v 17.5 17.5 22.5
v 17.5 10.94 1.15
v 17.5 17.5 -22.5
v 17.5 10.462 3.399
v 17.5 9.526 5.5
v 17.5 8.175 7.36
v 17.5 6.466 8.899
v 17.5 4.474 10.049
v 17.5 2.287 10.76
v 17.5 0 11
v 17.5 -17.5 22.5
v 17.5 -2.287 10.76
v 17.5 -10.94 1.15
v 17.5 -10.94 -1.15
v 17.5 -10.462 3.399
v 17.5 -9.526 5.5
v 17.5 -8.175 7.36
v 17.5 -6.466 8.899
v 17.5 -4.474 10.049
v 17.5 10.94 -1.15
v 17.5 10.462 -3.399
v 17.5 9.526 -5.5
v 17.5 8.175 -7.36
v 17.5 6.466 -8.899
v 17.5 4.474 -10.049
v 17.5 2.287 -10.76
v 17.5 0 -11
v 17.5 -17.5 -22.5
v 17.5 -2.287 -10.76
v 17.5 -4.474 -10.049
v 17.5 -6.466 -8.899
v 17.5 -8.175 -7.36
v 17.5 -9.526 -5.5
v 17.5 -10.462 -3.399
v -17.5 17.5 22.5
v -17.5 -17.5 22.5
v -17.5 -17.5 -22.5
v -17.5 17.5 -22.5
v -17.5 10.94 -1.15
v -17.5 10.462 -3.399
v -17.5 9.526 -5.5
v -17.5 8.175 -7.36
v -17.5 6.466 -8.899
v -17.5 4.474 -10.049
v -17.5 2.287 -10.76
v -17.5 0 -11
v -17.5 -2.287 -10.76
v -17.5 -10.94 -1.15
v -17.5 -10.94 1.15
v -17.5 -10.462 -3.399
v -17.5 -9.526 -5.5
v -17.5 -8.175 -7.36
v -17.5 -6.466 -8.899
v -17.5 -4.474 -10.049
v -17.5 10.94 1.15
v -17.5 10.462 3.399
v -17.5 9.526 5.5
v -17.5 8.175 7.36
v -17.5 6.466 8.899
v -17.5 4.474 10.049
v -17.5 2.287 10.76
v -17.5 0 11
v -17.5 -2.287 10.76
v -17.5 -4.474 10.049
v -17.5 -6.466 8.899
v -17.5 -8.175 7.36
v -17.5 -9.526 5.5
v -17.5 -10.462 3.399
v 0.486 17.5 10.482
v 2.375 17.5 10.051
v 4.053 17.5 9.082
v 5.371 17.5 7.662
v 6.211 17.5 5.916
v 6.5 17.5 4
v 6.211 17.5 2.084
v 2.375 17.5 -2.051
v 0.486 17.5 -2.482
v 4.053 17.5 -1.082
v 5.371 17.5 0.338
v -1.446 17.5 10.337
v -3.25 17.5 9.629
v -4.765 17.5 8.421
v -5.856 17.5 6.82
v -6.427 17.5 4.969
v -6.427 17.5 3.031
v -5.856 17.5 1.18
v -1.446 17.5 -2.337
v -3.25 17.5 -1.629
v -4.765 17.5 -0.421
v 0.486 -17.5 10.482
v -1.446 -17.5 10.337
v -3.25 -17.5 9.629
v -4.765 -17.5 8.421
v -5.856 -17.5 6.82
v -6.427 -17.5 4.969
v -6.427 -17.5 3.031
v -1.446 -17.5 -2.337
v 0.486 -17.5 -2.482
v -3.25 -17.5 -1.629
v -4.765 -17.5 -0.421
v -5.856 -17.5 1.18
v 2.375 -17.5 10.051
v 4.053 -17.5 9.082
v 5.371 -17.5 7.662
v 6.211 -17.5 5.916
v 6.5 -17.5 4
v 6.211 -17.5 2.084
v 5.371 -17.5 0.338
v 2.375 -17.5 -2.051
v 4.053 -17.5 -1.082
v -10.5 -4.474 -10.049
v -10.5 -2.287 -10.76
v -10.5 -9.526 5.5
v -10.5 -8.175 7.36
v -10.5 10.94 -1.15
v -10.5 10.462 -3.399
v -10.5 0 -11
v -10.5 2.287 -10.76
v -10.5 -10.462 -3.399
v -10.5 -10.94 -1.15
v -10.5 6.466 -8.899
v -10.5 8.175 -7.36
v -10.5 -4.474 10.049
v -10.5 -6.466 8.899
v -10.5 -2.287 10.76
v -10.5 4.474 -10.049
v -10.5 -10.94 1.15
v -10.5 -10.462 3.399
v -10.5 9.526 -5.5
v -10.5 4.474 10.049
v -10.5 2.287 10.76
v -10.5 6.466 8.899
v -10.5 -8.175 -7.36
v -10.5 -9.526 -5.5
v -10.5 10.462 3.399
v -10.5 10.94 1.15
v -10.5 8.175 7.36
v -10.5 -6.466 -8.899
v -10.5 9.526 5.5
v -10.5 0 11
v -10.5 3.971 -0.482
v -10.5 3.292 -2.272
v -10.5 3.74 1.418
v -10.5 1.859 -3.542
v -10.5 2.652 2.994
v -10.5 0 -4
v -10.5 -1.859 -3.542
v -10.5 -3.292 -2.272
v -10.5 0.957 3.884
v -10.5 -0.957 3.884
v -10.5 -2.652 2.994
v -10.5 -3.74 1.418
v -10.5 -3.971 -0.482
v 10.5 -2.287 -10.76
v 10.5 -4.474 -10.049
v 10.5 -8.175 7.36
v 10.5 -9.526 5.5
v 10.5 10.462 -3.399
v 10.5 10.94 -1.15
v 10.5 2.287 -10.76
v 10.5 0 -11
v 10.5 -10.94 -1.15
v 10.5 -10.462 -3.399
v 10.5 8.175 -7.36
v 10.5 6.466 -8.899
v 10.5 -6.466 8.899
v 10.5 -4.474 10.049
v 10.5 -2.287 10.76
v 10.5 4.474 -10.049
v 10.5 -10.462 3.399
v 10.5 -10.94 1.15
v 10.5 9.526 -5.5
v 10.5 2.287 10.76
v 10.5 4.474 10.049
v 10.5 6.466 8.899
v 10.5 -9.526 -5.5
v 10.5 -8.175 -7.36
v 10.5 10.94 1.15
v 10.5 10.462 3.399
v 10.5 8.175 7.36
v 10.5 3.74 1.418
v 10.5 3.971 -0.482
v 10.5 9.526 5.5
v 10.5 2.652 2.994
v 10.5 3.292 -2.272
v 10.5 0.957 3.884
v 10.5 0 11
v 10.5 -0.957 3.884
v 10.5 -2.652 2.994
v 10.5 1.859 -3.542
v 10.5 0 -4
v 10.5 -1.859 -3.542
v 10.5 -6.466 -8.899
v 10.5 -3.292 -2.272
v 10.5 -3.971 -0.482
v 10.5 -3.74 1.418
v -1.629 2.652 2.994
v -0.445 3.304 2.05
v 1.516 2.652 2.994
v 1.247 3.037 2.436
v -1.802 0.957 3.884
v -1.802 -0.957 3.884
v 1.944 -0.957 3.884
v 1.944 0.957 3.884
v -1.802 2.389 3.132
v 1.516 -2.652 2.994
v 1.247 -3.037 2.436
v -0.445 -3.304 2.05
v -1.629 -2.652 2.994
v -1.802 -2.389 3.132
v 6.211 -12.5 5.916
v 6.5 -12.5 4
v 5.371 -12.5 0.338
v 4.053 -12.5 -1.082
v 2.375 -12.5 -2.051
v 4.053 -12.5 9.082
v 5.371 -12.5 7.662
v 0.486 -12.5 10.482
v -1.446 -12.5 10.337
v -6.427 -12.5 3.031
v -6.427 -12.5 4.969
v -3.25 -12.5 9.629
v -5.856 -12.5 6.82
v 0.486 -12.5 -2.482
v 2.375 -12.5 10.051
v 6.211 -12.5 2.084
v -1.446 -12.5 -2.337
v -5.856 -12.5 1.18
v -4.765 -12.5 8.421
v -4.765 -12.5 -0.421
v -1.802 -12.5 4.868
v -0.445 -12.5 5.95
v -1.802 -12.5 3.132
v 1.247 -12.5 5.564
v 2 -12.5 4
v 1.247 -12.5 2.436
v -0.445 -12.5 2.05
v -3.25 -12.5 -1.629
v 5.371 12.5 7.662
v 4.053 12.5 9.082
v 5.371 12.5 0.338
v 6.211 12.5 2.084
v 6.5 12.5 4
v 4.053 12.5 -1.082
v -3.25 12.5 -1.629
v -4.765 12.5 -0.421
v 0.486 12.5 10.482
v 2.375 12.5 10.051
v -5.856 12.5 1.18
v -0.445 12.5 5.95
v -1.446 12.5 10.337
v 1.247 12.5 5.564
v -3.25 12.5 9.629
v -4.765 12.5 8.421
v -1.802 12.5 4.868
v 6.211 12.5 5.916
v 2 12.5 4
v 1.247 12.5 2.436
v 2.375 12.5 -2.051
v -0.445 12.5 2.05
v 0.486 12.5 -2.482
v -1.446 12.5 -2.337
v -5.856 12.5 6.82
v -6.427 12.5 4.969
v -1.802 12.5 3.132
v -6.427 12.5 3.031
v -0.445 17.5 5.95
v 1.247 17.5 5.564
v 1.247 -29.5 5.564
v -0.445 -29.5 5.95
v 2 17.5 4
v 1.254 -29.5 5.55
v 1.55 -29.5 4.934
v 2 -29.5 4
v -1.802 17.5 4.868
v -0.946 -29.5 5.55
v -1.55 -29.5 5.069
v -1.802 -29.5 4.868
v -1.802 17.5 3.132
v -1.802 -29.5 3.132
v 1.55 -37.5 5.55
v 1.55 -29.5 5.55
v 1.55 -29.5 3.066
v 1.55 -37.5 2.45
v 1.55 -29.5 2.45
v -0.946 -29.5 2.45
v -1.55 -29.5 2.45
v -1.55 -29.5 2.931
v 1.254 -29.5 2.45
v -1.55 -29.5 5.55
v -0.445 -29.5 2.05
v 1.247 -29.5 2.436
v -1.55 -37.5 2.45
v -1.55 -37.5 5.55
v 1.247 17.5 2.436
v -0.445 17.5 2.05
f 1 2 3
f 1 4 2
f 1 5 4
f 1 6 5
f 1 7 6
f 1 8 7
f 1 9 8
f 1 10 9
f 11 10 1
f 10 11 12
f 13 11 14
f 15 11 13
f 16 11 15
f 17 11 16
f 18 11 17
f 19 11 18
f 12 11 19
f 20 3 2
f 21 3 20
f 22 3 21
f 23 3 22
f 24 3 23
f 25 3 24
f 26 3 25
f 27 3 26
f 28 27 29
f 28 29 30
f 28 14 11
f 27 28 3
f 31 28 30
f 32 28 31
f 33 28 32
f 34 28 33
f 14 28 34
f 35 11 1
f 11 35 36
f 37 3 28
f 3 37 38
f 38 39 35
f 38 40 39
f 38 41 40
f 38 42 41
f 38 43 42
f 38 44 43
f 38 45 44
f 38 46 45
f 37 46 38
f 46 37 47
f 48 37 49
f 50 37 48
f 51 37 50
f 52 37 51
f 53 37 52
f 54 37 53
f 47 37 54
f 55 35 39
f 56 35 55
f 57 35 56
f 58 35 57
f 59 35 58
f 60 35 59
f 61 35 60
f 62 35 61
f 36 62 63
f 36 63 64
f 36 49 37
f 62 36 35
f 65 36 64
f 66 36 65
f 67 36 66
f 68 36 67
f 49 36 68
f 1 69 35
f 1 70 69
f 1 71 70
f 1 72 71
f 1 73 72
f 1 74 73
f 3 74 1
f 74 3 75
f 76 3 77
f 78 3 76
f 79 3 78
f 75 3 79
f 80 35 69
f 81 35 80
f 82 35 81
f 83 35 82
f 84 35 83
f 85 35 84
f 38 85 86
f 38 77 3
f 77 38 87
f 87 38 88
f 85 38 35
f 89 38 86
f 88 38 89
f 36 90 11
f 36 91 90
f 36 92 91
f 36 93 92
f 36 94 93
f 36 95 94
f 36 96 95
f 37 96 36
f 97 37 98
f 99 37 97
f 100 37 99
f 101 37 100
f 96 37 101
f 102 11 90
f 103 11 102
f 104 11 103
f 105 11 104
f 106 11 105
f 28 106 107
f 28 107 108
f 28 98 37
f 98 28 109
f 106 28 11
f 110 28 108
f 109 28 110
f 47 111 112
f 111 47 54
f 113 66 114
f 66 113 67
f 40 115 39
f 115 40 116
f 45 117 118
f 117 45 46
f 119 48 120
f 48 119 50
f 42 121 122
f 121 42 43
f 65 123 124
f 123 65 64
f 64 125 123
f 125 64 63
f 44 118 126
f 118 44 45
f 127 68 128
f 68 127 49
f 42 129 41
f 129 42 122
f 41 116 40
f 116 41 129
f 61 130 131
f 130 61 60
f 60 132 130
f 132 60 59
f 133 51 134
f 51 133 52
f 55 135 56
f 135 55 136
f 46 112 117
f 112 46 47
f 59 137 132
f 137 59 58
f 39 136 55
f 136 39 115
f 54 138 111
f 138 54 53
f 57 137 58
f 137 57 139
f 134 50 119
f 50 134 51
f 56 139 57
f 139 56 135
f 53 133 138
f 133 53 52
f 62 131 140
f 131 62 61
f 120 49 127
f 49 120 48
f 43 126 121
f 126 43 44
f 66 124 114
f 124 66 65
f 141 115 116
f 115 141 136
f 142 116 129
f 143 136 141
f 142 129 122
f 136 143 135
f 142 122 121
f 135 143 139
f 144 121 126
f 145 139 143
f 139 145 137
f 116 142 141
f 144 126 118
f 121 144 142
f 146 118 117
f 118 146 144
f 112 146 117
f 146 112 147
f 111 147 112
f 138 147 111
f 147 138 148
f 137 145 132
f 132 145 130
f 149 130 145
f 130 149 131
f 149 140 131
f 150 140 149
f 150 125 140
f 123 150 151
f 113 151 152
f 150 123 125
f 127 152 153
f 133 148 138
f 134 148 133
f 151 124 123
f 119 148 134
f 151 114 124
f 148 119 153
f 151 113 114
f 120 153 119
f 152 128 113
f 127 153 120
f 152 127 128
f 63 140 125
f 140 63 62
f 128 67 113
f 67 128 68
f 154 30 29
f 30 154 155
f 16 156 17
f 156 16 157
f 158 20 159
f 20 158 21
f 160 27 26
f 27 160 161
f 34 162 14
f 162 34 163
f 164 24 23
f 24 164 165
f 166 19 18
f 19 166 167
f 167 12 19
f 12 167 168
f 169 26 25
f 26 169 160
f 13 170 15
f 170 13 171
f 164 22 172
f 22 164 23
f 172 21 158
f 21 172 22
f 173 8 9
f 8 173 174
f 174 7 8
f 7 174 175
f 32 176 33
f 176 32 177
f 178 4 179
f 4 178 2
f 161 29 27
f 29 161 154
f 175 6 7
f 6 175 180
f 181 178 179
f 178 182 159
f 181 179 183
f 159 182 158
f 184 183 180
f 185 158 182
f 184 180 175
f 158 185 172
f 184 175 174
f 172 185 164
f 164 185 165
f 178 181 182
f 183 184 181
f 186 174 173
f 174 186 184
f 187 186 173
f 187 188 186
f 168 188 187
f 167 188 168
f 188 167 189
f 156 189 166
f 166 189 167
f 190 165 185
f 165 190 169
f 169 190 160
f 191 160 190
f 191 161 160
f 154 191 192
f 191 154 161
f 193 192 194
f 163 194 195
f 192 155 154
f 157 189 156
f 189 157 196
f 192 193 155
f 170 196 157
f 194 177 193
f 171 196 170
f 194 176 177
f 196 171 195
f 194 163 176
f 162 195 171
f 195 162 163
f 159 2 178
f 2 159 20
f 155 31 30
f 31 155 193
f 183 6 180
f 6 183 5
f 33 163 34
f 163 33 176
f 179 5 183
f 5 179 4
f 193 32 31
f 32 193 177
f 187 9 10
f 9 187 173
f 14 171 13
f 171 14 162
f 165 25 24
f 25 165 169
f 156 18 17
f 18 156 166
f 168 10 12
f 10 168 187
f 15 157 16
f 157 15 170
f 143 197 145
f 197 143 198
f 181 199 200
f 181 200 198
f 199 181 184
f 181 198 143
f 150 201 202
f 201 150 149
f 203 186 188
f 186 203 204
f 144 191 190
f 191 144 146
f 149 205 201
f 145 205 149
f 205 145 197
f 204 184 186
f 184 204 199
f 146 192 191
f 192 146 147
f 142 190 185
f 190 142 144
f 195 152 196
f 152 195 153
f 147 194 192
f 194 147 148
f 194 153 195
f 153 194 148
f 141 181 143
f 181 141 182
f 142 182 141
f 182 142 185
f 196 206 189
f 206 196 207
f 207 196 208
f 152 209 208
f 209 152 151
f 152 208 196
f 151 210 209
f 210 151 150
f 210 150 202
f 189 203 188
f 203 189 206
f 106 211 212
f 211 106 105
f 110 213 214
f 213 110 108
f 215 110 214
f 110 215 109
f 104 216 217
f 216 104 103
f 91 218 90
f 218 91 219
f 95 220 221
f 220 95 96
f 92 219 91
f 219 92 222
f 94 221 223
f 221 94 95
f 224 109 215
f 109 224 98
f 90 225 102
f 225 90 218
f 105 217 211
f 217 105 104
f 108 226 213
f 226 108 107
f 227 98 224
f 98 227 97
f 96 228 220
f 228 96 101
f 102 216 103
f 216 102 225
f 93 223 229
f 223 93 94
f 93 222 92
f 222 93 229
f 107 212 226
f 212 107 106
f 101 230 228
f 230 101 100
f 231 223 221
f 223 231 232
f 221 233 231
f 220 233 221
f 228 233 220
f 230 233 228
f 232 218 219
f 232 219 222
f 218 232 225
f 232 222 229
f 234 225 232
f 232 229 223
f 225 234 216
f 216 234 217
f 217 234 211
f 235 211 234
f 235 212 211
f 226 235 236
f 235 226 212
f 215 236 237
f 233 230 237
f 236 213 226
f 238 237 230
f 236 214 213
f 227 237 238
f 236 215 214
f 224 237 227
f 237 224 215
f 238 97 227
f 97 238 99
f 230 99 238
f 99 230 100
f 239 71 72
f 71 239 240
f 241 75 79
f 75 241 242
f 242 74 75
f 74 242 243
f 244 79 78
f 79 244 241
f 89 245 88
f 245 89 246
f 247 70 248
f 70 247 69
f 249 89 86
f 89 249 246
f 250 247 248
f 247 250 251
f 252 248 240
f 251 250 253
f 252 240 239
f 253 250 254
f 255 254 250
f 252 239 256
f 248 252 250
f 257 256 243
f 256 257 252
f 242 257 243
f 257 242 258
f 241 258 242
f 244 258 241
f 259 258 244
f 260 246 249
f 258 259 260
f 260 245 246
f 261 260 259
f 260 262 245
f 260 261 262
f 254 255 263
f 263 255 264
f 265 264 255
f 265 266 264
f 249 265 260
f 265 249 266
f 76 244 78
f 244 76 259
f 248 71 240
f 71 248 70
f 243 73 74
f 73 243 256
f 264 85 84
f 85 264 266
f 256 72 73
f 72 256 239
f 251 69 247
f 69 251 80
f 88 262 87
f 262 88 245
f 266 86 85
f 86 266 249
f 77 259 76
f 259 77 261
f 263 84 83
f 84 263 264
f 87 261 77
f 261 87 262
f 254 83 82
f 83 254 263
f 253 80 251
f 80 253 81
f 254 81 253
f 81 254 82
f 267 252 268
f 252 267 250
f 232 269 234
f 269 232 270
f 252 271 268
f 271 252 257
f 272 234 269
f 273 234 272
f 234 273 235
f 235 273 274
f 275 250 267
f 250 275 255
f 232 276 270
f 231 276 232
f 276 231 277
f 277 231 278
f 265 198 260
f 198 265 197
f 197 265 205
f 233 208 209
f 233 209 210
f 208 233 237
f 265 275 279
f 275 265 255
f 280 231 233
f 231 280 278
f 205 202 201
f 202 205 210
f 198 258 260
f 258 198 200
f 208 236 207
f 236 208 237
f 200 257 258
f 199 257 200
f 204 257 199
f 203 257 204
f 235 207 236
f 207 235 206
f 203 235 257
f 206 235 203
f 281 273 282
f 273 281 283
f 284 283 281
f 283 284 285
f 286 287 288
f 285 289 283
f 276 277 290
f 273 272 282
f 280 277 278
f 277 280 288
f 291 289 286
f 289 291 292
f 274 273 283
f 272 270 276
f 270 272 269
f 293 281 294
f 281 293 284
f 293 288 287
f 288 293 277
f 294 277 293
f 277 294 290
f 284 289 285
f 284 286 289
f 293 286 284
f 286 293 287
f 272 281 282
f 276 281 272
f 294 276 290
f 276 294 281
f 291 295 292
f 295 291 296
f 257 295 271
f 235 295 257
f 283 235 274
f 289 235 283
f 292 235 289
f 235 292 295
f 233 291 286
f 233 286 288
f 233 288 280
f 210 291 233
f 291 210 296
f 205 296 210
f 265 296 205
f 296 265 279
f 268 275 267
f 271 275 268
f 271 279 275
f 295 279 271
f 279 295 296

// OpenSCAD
// file: Tap.scad
//This is my attempt to model a Tap.


//Create a tap by specifying size of square, length of square, shank length, thread length
module Tap(diameter,sqrSize,sqrLength,shankLength,threadLength)
	{
	echo("********************************************");
	echo("Creating tap with following dimensions");
	echo("Diameter: ",diameter);
	echo("Square size: ",sqrSize);
	echo("Square length: ",sqrLength);
	echo("Shank Length: ",shankLength);
	echo("Thread Length: ",threadLength);
	echo("********************************************");

	//square key
	translate([-sqrSize/2,-sqrSize/2,0]) cube([sqrSize,sqrSize,sqrLength]);
	
	//shank
	translate([0,0,sqrLength])cylinder(shankLength,diameter/2,diameter/2);

	//thread
	translate([0,0,sqrLength+shankLength])cylinder(threadLength,diameter/2,diameter/2);

	}

//Parameters ***********************************

//tap diameter
diameter=4;

//Square Size
sqrSize=3.1;

//square length
sqrLength=8;

//Shank length
shankLength=23;

//depth of head
threadLength=24;

//**********************************************

Tap(diameter,sqrSize,sqrLength,shankLength,threadLength);
// file: Bearing.scad
//This is my attempt to model a bearing.


//Create a bearing by specifying internal diameter, external diameter and width.
module Bearing(int_Diameter,ext_Diameter,width)
	{
	echo("********************************************");
	echo("Creating bearing with following dimensions");
	echo("Internal Diameter: ",int_Diameter);
	echo("External Diameter: ",ext_Diameter);
	echo("Width: ",width);
	echo("********************************************");



	//create external cylinder minus internal cylinder
	difference()
		{
		bearingExternalGeom(ext_Diameter,width);
		cylinder(width,int_Diameter/2,int_Diameter/2);
		}
	


//	translate([-side_length/2,-head_size/2,0]) cube([side_length,head_size,head_depth]);
	//rotate([0,0,120]) translate([-side_length/2,-head_size/2,0])cube([side_length,head_size,head_depth]);
	//rotate([0,0,240]) translate([-side_length/2,-head_size/2,0])cube([side_length,head_size,head_depth]);
	
	//Add shaft offset by depth of head
	//shaft_radius=diameter/2;
//	translate([0,0,head_depth]) cylinder(length,shaft_radius,shaft_radius);
	}

//use for getting external geometry only (for binary commands)
module bearingExternalGeom(ext_Diameter,width)
	{
	echo("********************************************");
	echo("Creating bearing (external geometry) with following dimensions");
	echo("External Diameter: ",ext_Diameter);
	echo("Width: ",width);
	echo("********************************************");
	cylinder(width,ext_Diameter/2,ext_Diameter/2);
	
	}

//Parameters ***********************************
//Internal diameter
int_Diameter=4;

//External Diameter
ext_Diameter=13;

//width
width=5;

//608=8,22,7
//624=4,13,5
//**********************************************

Bearing(int_Diameter,ext_Diameter,width);
// file: Bolt.scad
//This is my attempt to model a bolt.


//Create a bolt by specifying shaft diameter, shaft length, distance accross head flats, and depth of head
module Bolt(diameter,length,head_size,head_depth)
	{
	echo("********************************************");
	echo("Creating bolt with following dimensions");
	echo("Diameter: ",diameter);
	echo("Shaft length: ",length);
	echo("Head size (between flats): ",head_size);
	echo("Head depth: ",head_depth);
	echo("********************************************");

	//Calculate dimentions of hexagon for head of bolt based on distance
	//between flats

	//google found..
	//side_length= 2a tan (180/n)
	//a  is the length of the apothem (inradius)
	//n  is the number of sides
	//tan  is the tangent function calculated in degrees
   side_length=2*head_size/2* tan(180/6);

	//create hexagonal head from 3 cubes rotated 120 degrees
	translate([-side_length/2,-head_size/2,0]) cube([side_length,head_size,head_depth]);
	rotate([0,0,120]) translate([-side_length/2,-head_size/2,0])cube([side_length,head_size,head_depth]);
	rotate([0,0,240]) translate([-side_length/2,-head_size/2,0])cube([side_length,head_size,head_depth]);
	
	//Add shaft offset by depth of head
	shaft_radius=diameter/2;
	translate([0,0,head_depth]) cylinder(length,shaft_radius,shaft_radius);
	}

//Parameters ***********************************
//diameter of shaft
diameter=8;

//length of shaft
length=50;

//distance between flats of head
head_size=13;

//depth of head
head_depth=4.8;

//**********************************************

Bolt(diameter,length,head_size,head_depth);
// main file
//Hobbed bolt hobber thingy.
//Needs to hold the bolt and m4 tap securely in position.

use <Bolt.scad>;
use <Bearing.scad>;
use <Tap.scad>;

//main frame of tool
module frame(length,width,height)
	{
	difference()
		{

		//cube for frame
		translate([-width/2,-length/2,-height/2])cube([length,width,height]);

		//lhs bolt bearing
		translate([-width/2,0,0])rotate([0,90,0])boltBearing();
	
		//rhs bolt bearing
		translate([width/2-7,0,0])rotate([0,90,0])boltBearing();
		
		//bolt shaft
		translate([-width/2,0,0])rotate([0,90,0])cylinder(width,4,4);

		//tap front bearing
		translate([0,-width/2+5,4])rotate([90,0,0])tapBearing();

		//tap back bearing
		translate([0,width/2-5,4])rotate([270,0,0])tapBearing();

		//tap shaft
		translate([0,width/2,4])rotate([90,0,0])cylinder(width,2,2);
		}
		
	}

module tapBearing()
	{
	Bearing(4,13,5);
	}

module boltBearing()
	{
	intDiameter=8;
	extDiameter=22;
	width=7;
	bearingExternalGeom(extDiameter,width);
	}

module tapBearing()
	{
	intDiameter=4;
	extDiameter=13;
	width=5;
	bearingExternalGeom(extDiameter,width);
	}

module M4Tap()
	{
	diameter=4;
	sqrSize=3.1;
	sqrLength=8;
	shankLength=23;
	threadLength=24;
	Tap(diameter,sqrSize,sqrLength,shankLength,threadLength);
	}

//Parameters ***********************************
//frame length
length=35;

//frame width
width=35;

//frame height
height=45;

//**********************************************
frame(length,width,height);
translate([0,-length/2-20,4])rotate([270,0,0]) M4Tap();
